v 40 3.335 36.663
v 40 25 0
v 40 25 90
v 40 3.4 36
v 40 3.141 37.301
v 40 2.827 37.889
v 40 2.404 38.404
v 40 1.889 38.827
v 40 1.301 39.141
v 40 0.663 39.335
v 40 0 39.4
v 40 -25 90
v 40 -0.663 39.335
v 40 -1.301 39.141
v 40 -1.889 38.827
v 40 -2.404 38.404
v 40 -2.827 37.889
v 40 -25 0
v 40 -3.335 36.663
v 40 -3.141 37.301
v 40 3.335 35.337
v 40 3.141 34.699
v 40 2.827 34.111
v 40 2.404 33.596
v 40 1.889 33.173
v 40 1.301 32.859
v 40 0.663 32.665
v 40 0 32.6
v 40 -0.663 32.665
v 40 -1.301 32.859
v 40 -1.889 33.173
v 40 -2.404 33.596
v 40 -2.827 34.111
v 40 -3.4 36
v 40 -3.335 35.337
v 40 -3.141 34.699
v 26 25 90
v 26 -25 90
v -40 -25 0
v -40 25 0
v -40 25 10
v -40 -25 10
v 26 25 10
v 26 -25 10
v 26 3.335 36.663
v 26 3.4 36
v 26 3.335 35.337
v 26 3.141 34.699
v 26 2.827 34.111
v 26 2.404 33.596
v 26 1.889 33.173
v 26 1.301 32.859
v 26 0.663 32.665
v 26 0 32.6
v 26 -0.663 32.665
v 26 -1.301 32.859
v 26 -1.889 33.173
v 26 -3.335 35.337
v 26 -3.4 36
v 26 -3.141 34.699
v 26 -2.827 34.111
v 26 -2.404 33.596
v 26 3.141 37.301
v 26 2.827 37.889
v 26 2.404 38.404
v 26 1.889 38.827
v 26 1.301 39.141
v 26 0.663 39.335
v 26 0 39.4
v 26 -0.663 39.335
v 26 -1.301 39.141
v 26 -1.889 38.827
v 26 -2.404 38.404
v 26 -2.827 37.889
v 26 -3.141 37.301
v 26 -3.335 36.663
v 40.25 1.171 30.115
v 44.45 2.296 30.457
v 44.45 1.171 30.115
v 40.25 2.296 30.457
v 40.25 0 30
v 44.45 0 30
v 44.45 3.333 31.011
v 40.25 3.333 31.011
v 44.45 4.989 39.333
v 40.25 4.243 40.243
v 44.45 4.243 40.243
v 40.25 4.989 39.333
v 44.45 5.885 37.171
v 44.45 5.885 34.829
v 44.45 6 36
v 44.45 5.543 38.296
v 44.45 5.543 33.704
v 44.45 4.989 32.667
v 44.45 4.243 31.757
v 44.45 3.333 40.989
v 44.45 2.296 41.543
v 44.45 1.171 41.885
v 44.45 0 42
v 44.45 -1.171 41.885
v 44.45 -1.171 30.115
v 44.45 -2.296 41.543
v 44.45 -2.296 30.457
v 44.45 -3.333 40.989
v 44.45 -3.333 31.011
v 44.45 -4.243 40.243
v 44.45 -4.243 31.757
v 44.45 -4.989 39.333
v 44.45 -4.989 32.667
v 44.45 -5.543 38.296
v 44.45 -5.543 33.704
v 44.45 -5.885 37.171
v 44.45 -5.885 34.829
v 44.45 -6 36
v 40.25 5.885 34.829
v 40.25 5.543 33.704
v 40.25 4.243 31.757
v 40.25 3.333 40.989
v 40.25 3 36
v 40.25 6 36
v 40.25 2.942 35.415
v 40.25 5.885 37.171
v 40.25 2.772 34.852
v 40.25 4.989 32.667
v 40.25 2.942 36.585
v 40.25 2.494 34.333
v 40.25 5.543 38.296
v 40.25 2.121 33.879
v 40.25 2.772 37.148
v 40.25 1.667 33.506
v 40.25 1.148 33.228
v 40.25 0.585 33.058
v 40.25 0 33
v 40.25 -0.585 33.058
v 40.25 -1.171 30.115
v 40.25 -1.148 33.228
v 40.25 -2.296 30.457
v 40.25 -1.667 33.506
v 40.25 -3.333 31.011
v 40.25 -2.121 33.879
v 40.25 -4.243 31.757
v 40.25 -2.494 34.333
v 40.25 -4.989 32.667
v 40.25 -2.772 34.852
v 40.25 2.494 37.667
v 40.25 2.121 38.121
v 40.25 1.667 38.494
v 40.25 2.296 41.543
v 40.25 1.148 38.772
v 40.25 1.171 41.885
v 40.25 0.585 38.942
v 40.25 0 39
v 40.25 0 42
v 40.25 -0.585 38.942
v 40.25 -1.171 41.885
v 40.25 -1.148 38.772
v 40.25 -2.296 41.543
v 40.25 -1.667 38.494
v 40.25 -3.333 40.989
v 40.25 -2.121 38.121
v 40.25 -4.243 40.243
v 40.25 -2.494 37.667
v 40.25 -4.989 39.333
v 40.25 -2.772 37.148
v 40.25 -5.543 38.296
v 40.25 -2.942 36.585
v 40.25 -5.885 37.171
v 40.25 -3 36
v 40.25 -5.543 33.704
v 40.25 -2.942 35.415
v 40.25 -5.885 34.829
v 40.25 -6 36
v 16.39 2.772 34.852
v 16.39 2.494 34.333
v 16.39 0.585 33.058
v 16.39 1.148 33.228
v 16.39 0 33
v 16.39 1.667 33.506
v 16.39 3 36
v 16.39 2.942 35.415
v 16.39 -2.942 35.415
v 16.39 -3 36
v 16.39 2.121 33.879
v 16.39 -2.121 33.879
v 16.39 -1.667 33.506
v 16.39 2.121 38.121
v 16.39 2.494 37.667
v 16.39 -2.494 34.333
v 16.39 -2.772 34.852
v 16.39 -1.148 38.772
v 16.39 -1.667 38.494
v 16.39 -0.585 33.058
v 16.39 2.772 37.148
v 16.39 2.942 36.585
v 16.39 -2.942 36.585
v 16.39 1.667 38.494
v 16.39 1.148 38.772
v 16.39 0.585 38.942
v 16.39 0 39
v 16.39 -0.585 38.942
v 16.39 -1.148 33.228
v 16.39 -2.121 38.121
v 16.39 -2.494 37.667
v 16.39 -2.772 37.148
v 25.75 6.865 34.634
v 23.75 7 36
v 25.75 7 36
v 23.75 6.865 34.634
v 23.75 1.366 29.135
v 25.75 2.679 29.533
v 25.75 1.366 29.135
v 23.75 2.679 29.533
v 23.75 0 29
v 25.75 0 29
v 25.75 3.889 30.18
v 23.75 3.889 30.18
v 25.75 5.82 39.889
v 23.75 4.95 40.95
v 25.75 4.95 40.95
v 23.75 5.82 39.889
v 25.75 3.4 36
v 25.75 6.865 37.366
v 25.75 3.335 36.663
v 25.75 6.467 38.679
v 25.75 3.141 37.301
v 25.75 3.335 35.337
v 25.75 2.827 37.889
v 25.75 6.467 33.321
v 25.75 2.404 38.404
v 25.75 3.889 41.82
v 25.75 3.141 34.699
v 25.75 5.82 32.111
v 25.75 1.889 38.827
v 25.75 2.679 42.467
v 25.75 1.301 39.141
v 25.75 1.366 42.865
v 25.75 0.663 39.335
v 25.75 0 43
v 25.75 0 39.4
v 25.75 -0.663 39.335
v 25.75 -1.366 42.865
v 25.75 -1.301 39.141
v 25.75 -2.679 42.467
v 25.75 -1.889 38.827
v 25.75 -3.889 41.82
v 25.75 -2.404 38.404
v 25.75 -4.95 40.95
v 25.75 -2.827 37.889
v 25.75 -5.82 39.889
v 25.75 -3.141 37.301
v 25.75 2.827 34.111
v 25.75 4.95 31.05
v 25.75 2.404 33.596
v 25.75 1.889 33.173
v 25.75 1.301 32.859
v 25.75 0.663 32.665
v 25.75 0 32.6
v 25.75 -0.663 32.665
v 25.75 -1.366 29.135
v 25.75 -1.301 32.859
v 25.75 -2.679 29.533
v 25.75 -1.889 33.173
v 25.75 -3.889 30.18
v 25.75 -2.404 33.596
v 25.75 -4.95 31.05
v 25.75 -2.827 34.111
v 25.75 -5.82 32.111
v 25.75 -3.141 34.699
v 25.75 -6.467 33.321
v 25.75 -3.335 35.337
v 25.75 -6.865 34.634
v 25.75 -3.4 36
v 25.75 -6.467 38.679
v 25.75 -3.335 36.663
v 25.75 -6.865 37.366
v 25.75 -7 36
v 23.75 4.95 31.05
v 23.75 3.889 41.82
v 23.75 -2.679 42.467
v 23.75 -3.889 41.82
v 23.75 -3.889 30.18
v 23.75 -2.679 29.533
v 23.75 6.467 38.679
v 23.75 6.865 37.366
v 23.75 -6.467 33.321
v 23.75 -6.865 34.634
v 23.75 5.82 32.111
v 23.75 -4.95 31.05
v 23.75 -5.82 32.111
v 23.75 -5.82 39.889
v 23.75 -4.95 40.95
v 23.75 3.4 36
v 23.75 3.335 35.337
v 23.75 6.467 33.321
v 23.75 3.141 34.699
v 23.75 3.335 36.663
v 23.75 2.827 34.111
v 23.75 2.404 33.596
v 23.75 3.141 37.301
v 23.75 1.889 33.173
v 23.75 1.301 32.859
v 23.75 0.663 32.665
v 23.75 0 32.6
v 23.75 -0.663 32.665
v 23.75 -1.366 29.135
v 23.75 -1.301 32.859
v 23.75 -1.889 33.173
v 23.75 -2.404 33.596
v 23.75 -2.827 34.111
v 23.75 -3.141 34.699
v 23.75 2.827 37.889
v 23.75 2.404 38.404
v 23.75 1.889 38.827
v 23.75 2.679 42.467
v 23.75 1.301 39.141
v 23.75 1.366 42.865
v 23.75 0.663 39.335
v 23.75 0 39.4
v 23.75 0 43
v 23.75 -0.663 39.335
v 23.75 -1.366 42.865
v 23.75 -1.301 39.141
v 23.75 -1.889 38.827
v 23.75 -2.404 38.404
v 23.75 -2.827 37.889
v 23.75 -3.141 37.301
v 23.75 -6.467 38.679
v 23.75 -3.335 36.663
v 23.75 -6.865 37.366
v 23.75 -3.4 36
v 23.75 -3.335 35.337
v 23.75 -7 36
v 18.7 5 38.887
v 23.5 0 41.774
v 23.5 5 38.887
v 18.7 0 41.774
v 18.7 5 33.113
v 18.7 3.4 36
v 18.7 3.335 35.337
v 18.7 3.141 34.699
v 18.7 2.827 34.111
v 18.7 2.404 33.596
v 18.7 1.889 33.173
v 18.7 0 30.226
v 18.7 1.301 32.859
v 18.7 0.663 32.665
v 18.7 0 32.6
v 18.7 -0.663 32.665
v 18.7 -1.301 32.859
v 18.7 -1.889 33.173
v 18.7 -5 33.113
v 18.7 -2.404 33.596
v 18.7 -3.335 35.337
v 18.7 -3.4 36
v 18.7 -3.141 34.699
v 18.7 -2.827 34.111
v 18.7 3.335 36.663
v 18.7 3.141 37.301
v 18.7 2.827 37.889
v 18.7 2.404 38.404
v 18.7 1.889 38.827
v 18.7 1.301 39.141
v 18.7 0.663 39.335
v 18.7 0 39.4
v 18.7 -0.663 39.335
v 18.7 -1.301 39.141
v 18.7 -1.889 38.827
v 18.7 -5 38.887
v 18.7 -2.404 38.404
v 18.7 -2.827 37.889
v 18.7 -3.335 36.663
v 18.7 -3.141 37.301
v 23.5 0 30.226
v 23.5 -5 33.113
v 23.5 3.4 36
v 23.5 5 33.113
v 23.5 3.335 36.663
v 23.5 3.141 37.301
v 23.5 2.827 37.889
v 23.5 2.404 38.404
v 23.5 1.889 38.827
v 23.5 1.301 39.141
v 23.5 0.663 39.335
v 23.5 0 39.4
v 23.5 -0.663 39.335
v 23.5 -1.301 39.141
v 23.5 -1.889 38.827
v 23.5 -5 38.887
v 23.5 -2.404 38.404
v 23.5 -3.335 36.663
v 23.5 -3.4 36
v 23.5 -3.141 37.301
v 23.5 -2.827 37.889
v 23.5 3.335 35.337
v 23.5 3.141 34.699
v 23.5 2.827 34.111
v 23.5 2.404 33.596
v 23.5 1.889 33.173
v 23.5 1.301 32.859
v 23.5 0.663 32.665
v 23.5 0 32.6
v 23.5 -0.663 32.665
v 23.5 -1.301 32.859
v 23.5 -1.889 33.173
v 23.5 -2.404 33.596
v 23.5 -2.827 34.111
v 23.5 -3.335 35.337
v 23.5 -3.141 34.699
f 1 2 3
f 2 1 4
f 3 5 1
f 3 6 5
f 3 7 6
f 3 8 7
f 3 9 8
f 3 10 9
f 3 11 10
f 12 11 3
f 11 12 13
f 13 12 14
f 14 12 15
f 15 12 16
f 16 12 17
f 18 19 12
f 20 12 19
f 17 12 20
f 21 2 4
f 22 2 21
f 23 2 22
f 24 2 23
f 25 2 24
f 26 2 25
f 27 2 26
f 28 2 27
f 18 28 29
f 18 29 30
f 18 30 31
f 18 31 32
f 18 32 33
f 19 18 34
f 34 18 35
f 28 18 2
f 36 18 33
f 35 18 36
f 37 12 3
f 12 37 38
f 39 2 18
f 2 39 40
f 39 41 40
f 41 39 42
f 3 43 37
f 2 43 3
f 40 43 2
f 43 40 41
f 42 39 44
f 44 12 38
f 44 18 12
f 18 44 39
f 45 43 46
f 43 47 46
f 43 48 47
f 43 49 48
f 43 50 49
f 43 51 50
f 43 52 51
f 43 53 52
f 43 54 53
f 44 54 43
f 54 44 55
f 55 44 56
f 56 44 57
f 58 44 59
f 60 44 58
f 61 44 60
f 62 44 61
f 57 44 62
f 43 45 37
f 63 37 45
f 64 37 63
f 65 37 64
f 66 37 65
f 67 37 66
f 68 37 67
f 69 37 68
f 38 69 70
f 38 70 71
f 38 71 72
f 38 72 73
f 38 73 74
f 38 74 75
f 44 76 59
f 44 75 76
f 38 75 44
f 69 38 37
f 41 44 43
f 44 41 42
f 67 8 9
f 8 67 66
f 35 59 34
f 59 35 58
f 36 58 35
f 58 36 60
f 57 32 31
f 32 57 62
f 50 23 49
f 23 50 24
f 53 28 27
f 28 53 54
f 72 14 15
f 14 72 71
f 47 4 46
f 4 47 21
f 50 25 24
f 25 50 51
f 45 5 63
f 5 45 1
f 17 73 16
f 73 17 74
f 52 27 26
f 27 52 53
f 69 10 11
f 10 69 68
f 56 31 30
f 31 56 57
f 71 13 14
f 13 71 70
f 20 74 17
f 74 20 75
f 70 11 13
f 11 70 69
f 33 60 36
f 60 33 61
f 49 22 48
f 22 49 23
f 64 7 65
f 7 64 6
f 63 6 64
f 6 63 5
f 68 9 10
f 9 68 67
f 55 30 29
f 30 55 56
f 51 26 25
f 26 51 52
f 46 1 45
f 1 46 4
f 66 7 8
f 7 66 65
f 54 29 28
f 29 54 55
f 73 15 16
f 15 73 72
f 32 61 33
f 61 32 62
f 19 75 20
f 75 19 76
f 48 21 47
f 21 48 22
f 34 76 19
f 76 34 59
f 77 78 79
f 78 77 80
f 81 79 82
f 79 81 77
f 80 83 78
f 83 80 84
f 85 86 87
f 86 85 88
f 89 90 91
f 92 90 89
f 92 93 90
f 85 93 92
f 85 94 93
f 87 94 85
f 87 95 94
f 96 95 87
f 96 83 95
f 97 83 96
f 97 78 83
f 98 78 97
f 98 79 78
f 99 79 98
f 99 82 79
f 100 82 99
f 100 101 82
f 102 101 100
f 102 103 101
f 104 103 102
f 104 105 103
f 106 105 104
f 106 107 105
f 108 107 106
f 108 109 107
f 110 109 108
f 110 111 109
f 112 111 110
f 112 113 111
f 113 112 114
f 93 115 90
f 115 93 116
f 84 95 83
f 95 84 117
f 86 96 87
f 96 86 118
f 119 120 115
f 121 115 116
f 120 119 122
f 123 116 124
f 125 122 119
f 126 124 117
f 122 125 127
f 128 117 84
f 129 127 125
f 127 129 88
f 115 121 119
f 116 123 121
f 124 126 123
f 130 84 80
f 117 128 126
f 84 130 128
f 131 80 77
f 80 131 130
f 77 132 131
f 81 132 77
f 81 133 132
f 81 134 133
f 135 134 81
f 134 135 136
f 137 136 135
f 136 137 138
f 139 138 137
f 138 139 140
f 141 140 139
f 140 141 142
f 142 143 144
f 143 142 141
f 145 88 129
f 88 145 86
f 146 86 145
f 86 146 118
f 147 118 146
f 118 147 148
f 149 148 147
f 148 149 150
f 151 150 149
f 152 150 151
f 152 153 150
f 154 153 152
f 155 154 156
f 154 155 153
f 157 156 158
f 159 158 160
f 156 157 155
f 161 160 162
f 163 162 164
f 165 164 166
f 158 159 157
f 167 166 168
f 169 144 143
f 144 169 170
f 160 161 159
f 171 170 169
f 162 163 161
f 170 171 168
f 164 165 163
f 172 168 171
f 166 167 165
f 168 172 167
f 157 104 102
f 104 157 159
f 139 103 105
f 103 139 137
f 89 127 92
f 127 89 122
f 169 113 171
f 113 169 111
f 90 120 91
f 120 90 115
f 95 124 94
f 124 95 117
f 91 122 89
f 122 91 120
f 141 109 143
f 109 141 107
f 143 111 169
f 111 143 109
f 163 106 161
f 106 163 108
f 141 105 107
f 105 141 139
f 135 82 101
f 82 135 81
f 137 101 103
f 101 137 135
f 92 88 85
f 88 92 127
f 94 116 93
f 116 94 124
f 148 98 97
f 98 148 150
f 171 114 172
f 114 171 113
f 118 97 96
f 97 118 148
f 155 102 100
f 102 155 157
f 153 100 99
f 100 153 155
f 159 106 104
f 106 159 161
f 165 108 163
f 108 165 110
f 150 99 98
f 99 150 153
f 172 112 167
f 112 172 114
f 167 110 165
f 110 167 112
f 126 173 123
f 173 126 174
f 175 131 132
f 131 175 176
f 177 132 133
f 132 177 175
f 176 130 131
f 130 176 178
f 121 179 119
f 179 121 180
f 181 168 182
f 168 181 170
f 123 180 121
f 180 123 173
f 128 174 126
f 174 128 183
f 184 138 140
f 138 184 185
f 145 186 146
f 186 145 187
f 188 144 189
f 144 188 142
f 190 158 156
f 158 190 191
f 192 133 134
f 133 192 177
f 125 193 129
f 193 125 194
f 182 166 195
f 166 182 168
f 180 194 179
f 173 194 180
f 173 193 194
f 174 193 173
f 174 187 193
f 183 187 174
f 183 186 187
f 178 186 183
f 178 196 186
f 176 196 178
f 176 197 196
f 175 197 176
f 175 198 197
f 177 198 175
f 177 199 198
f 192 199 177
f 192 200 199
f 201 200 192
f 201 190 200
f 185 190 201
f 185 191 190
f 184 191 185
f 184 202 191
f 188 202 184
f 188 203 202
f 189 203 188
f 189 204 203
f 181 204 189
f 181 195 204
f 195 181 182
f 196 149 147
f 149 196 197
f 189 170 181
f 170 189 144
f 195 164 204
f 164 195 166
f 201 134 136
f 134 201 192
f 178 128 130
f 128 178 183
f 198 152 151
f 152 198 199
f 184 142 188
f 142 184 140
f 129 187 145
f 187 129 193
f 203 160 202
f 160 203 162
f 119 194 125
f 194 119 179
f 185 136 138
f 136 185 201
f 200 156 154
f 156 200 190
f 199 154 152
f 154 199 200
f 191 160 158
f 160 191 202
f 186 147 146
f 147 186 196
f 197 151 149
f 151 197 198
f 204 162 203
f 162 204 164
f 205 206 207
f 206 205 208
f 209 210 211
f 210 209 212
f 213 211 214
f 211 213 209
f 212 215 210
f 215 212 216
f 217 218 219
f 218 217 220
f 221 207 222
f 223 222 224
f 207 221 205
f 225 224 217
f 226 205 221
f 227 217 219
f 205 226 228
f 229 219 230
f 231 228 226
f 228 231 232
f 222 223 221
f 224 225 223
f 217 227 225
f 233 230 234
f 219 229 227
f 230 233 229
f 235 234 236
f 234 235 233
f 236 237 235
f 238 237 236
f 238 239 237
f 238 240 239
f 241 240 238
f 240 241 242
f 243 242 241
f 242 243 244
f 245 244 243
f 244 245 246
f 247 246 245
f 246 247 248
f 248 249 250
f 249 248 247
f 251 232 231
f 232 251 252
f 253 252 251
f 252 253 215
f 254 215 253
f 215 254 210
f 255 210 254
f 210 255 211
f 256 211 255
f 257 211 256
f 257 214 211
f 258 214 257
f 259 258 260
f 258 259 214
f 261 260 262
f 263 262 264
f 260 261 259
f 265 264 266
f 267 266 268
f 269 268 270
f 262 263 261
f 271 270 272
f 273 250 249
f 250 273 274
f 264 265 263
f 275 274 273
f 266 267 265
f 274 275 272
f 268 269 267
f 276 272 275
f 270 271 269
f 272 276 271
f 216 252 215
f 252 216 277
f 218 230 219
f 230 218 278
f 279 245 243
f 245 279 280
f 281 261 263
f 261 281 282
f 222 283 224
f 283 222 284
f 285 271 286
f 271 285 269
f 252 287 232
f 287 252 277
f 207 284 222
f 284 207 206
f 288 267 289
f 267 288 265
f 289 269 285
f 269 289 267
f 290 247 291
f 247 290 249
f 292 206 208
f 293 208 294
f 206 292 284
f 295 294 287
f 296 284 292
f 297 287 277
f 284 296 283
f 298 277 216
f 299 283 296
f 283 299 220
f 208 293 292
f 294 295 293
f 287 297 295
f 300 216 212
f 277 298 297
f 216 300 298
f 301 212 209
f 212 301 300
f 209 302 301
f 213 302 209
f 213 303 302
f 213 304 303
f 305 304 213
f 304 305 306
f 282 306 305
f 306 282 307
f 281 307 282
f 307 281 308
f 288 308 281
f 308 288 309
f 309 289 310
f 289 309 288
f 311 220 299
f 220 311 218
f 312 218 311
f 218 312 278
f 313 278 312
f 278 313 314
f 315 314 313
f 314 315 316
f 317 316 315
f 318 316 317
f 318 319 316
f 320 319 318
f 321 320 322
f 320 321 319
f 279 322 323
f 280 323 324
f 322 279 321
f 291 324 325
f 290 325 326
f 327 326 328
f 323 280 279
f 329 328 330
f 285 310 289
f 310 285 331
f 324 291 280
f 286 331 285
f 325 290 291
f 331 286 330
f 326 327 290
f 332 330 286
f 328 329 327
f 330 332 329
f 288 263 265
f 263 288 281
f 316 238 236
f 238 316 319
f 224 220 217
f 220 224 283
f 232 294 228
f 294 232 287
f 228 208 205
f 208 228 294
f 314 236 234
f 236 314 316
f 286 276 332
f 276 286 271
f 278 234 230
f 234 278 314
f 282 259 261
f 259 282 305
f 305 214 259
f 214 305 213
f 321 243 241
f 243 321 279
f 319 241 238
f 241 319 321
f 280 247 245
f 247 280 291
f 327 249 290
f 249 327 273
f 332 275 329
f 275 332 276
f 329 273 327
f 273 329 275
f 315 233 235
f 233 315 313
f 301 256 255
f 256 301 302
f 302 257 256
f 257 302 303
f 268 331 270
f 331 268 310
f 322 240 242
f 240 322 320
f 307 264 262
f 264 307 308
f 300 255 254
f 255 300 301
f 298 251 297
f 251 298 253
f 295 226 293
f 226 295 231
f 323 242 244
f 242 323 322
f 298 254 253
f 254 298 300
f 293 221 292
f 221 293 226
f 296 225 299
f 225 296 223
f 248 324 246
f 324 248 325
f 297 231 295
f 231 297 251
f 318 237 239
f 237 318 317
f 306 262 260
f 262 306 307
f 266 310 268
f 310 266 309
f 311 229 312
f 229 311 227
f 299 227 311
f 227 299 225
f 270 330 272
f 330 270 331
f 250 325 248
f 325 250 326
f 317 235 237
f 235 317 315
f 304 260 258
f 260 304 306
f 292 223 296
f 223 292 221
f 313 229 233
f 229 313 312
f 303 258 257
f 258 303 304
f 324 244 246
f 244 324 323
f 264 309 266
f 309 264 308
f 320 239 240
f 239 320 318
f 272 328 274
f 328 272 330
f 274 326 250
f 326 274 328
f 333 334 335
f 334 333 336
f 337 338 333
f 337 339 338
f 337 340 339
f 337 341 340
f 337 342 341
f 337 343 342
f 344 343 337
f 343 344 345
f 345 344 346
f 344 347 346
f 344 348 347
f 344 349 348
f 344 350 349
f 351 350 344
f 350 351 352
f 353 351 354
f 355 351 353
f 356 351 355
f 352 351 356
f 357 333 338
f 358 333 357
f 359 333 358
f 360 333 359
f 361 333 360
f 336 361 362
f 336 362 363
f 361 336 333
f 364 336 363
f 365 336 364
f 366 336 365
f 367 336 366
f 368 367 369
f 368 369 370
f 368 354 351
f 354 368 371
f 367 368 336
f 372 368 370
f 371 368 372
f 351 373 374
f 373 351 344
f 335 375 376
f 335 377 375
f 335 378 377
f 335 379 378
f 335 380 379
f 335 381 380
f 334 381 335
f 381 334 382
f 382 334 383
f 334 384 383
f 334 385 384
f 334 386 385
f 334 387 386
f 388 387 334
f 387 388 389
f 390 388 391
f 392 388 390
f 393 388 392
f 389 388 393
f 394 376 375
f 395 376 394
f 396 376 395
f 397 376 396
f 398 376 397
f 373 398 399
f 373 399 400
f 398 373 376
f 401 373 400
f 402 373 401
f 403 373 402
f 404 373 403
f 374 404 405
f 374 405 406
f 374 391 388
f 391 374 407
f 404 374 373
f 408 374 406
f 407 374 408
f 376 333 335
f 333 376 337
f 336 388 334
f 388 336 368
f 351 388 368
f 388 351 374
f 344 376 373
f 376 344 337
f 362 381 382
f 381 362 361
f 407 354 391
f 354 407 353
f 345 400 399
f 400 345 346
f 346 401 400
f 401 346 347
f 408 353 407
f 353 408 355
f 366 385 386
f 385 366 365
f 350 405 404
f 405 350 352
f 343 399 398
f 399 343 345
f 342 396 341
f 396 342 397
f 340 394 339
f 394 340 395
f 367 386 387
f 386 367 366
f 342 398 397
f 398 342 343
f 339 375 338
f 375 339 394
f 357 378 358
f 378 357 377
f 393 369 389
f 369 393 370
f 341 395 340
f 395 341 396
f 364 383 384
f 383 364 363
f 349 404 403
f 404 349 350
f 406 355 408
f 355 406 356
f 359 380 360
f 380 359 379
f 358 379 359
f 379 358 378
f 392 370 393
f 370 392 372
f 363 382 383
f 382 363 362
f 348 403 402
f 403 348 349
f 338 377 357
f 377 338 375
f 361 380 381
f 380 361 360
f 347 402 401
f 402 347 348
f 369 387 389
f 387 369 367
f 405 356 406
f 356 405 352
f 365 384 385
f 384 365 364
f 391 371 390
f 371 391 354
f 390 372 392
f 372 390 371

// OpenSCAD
$fn = 32;

// ------------------------------------------------------------------------
// Bolted bracket: 80 x 50 mm bracket with 1 bolt joints
// Every part is its own module, assembly() places them once.
// ------------------------------------------------------------------------

// --- part 1 ---
module bracket() {
  difference() {
    translate([-40, -25, 0]) cube([80, 50, 90]);
    translate([-41, -26, 10]) cube([67, 52, 81]);
    translate([33, 0, 36]) rotate([0, 90, 0]) cylinder(h = 16, d = 6.8, center = true);
  }
}

// --- part 2 ---
module bolt() {
  cylinder(h = 4.2, d = 12);
  translate([0, 0, -23.86]) cylinder(h = 23.86, d = 6);
}

// --- part 3 ---
module washer() {
  difference() {
      translate([0, 0, 0]) cylinder(h = 2, d = 14);
      translate([0, 0, -1]) cylinder(h = 4, d = 6.8);
    }
}

// --- part 4 ---
module nut() {
  difference() {
    linear_extrude(height = 4.8) polygon(points = [[5.774, 0], [2.887, 5], [-2.887, 5], [-5.774, 0], [-2.887, -5], [2.887, -5]]);
    translate([0, 0, -1]) cylinder(h = 6.8, d = 6.8);
  }
}

// --- assembly ---
module assembly() {
  translate([0, 0, 0]) rotate([0, 0, 0]) bracket();
  translate([40.25, 0, 36]) rotate([0, 90, 0]) bolt();
  translate([23.75, 0, 36]) rotate([0, 90, 0]) washer();
  translate([18.7, 0, 36]) rotate([0, 90, 0]) nut();
}

assembly();
